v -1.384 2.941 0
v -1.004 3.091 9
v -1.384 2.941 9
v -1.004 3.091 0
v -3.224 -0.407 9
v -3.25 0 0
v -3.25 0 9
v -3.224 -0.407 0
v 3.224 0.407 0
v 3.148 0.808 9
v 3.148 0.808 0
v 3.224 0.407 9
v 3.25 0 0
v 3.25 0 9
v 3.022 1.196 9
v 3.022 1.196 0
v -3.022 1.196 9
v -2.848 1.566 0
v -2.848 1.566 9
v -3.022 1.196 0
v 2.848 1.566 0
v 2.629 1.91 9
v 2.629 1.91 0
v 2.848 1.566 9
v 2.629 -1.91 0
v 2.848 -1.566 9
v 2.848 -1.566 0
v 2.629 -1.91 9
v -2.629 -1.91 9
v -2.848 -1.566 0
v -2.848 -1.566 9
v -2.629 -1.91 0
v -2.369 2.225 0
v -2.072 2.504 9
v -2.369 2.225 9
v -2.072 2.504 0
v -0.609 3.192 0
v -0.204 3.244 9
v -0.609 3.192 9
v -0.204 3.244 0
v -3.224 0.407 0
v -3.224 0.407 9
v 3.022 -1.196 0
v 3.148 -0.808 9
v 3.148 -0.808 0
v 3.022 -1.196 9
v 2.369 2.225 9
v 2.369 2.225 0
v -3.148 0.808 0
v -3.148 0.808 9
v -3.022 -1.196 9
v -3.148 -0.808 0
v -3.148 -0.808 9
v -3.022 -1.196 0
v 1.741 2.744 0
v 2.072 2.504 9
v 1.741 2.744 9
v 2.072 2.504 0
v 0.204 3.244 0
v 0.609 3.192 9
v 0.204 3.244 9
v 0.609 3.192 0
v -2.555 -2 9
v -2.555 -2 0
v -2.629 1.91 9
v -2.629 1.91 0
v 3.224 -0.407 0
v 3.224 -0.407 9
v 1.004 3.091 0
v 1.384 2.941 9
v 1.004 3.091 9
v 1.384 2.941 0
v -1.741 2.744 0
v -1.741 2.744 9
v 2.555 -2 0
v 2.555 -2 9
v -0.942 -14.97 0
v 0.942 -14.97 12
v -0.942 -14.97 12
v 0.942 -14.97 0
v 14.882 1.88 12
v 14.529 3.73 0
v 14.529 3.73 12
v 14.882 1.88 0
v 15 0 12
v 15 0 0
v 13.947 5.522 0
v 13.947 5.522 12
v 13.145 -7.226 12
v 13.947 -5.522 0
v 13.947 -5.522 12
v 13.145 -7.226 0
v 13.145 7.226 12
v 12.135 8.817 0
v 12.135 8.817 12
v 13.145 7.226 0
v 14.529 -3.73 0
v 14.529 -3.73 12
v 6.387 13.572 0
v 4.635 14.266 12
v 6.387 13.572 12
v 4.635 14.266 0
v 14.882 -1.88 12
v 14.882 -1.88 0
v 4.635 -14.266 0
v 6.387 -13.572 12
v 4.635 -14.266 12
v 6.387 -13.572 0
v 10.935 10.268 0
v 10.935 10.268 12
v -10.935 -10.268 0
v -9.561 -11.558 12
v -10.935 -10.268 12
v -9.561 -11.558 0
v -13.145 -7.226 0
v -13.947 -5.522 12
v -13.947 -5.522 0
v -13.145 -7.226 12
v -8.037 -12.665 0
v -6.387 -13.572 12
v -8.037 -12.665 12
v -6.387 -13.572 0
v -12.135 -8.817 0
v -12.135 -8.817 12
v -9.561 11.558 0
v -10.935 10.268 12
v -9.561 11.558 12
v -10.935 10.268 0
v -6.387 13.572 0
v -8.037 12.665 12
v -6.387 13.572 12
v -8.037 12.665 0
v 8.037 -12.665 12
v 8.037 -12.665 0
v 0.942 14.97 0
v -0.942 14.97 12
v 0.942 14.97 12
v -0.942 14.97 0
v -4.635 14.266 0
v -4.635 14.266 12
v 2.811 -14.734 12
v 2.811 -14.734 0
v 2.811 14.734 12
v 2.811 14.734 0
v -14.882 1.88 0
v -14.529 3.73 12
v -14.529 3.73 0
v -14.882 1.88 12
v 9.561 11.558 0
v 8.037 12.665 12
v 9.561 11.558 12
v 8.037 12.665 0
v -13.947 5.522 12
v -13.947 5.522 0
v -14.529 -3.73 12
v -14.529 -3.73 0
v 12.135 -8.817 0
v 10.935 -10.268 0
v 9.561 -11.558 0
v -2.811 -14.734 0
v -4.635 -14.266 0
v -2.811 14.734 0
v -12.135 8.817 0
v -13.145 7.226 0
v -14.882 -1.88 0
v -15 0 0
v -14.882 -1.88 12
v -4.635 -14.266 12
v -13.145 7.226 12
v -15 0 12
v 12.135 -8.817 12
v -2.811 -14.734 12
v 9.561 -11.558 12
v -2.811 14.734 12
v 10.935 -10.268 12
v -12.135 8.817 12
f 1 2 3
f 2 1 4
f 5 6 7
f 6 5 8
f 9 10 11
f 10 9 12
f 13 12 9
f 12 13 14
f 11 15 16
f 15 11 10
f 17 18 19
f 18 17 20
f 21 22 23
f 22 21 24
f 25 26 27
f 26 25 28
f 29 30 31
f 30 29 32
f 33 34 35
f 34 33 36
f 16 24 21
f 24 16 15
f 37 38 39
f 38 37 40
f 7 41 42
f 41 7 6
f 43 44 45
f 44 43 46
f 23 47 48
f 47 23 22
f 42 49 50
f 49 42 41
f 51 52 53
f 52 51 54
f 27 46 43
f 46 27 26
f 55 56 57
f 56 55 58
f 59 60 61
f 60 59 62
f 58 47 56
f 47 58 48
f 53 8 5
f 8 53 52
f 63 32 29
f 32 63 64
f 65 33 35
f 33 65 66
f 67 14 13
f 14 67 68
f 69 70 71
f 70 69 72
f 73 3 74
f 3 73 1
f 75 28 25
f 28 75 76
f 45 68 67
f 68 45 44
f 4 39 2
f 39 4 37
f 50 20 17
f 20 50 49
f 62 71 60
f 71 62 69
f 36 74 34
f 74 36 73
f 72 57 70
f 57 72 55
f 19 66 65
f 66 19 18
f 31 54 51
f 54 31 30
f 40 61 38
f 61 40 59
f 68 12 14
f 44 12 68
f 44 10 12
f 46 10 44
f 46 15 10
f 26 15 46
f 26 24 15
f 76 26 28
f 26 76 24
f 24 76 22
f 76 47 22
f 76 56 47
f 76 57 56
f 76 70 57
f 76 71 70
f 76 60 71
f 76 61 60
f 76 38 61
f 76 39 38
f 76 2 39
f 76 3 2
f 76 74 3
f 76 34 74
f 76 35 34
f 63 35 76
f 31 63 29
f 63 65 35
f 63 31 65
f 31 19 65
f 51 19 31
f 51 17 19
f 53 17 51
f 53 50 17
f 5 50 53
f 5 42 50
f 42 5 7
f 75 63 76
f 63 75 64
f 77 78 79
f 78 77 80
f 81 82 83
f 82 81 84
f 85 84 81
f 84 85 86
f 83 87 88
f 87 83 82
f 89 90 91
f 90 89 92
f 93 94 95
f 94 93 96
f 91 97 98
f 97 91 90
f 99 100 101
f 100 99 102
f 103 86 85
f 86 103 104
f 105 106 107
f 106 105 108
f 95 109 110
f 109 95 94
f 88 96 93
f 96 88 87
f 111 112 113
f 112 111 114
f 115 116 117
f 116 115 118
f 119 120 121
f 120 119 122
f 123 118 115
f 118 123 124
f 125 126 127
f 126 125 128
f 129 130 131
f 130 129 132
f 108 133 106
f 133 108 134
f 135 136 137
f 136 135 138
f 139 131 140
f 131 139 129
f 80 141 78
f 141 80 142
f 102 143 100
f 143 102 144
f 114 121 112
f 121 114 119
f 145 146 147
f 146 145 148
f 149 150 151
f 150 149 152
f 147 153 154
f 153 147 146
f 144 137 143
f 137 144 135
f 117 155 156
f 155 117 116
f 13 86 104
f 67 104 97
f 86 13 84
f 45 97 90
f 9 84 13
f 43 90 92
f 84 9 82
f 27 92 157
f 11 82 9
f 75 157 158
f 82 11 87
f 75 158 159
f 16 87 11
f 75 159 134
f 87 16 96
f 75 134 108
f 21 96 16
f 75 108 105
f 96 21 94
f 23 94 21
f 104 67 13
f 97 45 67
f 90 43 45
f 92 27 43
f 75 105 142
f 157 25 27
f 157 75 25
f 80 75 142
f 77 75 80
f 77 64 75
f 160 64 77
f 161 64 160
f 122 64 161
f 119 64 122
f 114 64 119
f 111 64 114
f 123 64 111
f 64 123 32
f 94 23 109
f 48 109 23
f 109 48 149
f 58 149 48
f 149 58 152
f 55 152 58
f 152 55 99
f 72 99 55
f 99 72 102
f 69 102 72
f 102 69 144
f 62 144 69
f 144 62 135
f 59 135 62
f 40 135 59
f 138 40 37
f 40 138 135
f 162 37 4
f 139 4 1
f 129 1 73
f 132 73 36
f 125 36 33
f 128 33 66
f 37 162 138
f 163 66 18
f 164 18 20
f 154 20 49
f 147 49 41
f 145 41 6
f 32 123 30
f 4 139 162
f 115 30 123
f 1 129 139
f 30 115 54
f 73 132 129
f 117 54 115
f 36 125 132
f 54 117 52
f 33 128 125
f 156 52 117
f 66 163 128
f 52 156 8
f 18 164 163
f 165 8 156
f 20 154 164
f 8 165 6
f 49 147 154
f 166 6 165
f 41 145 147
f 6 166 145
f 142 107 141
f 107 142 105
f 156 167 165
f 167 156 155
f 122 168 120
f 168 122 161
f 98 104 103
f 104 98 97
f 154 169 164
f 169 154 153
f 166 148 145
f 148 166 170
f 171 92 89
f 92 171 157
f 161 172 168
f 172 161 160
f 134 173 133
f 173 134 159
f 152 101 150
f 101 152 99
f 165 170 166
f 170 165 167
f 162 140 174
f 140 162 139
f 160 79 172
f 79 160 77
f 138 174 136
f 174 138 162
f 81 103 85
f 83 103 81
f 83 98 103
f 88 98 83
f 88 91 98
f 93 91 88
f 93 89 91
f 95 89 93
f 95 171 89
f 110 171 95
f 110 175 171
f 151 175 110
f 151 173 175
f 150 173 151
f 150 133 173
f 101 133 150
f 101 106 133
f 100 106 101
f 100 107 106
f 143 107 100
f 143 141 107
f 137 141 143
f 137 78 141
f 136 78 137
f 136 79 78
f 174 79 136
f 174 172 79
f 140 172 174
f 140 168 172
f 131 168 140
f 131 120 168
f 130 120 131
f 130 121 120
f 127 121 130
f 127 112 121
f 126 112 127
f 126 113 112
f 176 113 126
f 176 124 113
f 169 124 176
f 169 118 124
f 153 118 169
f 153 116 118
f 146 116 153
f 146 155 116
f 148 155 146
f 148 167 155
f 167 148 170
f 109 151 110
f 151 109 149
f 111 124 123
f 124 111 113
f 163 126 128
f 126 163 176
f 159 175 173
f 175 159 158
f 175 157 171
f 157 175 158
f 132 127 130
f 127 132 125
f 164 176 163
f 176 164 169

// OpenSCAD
$fn=50;


difference(){
	cylinder(r=15,h=12);

	difference(){
		translate([0,0,-1])
		cylinder(r=3.25,h=10);

		translate([4.6-10,-12,-2])
		cube([10,10,20]);	


	}

	
	
}
